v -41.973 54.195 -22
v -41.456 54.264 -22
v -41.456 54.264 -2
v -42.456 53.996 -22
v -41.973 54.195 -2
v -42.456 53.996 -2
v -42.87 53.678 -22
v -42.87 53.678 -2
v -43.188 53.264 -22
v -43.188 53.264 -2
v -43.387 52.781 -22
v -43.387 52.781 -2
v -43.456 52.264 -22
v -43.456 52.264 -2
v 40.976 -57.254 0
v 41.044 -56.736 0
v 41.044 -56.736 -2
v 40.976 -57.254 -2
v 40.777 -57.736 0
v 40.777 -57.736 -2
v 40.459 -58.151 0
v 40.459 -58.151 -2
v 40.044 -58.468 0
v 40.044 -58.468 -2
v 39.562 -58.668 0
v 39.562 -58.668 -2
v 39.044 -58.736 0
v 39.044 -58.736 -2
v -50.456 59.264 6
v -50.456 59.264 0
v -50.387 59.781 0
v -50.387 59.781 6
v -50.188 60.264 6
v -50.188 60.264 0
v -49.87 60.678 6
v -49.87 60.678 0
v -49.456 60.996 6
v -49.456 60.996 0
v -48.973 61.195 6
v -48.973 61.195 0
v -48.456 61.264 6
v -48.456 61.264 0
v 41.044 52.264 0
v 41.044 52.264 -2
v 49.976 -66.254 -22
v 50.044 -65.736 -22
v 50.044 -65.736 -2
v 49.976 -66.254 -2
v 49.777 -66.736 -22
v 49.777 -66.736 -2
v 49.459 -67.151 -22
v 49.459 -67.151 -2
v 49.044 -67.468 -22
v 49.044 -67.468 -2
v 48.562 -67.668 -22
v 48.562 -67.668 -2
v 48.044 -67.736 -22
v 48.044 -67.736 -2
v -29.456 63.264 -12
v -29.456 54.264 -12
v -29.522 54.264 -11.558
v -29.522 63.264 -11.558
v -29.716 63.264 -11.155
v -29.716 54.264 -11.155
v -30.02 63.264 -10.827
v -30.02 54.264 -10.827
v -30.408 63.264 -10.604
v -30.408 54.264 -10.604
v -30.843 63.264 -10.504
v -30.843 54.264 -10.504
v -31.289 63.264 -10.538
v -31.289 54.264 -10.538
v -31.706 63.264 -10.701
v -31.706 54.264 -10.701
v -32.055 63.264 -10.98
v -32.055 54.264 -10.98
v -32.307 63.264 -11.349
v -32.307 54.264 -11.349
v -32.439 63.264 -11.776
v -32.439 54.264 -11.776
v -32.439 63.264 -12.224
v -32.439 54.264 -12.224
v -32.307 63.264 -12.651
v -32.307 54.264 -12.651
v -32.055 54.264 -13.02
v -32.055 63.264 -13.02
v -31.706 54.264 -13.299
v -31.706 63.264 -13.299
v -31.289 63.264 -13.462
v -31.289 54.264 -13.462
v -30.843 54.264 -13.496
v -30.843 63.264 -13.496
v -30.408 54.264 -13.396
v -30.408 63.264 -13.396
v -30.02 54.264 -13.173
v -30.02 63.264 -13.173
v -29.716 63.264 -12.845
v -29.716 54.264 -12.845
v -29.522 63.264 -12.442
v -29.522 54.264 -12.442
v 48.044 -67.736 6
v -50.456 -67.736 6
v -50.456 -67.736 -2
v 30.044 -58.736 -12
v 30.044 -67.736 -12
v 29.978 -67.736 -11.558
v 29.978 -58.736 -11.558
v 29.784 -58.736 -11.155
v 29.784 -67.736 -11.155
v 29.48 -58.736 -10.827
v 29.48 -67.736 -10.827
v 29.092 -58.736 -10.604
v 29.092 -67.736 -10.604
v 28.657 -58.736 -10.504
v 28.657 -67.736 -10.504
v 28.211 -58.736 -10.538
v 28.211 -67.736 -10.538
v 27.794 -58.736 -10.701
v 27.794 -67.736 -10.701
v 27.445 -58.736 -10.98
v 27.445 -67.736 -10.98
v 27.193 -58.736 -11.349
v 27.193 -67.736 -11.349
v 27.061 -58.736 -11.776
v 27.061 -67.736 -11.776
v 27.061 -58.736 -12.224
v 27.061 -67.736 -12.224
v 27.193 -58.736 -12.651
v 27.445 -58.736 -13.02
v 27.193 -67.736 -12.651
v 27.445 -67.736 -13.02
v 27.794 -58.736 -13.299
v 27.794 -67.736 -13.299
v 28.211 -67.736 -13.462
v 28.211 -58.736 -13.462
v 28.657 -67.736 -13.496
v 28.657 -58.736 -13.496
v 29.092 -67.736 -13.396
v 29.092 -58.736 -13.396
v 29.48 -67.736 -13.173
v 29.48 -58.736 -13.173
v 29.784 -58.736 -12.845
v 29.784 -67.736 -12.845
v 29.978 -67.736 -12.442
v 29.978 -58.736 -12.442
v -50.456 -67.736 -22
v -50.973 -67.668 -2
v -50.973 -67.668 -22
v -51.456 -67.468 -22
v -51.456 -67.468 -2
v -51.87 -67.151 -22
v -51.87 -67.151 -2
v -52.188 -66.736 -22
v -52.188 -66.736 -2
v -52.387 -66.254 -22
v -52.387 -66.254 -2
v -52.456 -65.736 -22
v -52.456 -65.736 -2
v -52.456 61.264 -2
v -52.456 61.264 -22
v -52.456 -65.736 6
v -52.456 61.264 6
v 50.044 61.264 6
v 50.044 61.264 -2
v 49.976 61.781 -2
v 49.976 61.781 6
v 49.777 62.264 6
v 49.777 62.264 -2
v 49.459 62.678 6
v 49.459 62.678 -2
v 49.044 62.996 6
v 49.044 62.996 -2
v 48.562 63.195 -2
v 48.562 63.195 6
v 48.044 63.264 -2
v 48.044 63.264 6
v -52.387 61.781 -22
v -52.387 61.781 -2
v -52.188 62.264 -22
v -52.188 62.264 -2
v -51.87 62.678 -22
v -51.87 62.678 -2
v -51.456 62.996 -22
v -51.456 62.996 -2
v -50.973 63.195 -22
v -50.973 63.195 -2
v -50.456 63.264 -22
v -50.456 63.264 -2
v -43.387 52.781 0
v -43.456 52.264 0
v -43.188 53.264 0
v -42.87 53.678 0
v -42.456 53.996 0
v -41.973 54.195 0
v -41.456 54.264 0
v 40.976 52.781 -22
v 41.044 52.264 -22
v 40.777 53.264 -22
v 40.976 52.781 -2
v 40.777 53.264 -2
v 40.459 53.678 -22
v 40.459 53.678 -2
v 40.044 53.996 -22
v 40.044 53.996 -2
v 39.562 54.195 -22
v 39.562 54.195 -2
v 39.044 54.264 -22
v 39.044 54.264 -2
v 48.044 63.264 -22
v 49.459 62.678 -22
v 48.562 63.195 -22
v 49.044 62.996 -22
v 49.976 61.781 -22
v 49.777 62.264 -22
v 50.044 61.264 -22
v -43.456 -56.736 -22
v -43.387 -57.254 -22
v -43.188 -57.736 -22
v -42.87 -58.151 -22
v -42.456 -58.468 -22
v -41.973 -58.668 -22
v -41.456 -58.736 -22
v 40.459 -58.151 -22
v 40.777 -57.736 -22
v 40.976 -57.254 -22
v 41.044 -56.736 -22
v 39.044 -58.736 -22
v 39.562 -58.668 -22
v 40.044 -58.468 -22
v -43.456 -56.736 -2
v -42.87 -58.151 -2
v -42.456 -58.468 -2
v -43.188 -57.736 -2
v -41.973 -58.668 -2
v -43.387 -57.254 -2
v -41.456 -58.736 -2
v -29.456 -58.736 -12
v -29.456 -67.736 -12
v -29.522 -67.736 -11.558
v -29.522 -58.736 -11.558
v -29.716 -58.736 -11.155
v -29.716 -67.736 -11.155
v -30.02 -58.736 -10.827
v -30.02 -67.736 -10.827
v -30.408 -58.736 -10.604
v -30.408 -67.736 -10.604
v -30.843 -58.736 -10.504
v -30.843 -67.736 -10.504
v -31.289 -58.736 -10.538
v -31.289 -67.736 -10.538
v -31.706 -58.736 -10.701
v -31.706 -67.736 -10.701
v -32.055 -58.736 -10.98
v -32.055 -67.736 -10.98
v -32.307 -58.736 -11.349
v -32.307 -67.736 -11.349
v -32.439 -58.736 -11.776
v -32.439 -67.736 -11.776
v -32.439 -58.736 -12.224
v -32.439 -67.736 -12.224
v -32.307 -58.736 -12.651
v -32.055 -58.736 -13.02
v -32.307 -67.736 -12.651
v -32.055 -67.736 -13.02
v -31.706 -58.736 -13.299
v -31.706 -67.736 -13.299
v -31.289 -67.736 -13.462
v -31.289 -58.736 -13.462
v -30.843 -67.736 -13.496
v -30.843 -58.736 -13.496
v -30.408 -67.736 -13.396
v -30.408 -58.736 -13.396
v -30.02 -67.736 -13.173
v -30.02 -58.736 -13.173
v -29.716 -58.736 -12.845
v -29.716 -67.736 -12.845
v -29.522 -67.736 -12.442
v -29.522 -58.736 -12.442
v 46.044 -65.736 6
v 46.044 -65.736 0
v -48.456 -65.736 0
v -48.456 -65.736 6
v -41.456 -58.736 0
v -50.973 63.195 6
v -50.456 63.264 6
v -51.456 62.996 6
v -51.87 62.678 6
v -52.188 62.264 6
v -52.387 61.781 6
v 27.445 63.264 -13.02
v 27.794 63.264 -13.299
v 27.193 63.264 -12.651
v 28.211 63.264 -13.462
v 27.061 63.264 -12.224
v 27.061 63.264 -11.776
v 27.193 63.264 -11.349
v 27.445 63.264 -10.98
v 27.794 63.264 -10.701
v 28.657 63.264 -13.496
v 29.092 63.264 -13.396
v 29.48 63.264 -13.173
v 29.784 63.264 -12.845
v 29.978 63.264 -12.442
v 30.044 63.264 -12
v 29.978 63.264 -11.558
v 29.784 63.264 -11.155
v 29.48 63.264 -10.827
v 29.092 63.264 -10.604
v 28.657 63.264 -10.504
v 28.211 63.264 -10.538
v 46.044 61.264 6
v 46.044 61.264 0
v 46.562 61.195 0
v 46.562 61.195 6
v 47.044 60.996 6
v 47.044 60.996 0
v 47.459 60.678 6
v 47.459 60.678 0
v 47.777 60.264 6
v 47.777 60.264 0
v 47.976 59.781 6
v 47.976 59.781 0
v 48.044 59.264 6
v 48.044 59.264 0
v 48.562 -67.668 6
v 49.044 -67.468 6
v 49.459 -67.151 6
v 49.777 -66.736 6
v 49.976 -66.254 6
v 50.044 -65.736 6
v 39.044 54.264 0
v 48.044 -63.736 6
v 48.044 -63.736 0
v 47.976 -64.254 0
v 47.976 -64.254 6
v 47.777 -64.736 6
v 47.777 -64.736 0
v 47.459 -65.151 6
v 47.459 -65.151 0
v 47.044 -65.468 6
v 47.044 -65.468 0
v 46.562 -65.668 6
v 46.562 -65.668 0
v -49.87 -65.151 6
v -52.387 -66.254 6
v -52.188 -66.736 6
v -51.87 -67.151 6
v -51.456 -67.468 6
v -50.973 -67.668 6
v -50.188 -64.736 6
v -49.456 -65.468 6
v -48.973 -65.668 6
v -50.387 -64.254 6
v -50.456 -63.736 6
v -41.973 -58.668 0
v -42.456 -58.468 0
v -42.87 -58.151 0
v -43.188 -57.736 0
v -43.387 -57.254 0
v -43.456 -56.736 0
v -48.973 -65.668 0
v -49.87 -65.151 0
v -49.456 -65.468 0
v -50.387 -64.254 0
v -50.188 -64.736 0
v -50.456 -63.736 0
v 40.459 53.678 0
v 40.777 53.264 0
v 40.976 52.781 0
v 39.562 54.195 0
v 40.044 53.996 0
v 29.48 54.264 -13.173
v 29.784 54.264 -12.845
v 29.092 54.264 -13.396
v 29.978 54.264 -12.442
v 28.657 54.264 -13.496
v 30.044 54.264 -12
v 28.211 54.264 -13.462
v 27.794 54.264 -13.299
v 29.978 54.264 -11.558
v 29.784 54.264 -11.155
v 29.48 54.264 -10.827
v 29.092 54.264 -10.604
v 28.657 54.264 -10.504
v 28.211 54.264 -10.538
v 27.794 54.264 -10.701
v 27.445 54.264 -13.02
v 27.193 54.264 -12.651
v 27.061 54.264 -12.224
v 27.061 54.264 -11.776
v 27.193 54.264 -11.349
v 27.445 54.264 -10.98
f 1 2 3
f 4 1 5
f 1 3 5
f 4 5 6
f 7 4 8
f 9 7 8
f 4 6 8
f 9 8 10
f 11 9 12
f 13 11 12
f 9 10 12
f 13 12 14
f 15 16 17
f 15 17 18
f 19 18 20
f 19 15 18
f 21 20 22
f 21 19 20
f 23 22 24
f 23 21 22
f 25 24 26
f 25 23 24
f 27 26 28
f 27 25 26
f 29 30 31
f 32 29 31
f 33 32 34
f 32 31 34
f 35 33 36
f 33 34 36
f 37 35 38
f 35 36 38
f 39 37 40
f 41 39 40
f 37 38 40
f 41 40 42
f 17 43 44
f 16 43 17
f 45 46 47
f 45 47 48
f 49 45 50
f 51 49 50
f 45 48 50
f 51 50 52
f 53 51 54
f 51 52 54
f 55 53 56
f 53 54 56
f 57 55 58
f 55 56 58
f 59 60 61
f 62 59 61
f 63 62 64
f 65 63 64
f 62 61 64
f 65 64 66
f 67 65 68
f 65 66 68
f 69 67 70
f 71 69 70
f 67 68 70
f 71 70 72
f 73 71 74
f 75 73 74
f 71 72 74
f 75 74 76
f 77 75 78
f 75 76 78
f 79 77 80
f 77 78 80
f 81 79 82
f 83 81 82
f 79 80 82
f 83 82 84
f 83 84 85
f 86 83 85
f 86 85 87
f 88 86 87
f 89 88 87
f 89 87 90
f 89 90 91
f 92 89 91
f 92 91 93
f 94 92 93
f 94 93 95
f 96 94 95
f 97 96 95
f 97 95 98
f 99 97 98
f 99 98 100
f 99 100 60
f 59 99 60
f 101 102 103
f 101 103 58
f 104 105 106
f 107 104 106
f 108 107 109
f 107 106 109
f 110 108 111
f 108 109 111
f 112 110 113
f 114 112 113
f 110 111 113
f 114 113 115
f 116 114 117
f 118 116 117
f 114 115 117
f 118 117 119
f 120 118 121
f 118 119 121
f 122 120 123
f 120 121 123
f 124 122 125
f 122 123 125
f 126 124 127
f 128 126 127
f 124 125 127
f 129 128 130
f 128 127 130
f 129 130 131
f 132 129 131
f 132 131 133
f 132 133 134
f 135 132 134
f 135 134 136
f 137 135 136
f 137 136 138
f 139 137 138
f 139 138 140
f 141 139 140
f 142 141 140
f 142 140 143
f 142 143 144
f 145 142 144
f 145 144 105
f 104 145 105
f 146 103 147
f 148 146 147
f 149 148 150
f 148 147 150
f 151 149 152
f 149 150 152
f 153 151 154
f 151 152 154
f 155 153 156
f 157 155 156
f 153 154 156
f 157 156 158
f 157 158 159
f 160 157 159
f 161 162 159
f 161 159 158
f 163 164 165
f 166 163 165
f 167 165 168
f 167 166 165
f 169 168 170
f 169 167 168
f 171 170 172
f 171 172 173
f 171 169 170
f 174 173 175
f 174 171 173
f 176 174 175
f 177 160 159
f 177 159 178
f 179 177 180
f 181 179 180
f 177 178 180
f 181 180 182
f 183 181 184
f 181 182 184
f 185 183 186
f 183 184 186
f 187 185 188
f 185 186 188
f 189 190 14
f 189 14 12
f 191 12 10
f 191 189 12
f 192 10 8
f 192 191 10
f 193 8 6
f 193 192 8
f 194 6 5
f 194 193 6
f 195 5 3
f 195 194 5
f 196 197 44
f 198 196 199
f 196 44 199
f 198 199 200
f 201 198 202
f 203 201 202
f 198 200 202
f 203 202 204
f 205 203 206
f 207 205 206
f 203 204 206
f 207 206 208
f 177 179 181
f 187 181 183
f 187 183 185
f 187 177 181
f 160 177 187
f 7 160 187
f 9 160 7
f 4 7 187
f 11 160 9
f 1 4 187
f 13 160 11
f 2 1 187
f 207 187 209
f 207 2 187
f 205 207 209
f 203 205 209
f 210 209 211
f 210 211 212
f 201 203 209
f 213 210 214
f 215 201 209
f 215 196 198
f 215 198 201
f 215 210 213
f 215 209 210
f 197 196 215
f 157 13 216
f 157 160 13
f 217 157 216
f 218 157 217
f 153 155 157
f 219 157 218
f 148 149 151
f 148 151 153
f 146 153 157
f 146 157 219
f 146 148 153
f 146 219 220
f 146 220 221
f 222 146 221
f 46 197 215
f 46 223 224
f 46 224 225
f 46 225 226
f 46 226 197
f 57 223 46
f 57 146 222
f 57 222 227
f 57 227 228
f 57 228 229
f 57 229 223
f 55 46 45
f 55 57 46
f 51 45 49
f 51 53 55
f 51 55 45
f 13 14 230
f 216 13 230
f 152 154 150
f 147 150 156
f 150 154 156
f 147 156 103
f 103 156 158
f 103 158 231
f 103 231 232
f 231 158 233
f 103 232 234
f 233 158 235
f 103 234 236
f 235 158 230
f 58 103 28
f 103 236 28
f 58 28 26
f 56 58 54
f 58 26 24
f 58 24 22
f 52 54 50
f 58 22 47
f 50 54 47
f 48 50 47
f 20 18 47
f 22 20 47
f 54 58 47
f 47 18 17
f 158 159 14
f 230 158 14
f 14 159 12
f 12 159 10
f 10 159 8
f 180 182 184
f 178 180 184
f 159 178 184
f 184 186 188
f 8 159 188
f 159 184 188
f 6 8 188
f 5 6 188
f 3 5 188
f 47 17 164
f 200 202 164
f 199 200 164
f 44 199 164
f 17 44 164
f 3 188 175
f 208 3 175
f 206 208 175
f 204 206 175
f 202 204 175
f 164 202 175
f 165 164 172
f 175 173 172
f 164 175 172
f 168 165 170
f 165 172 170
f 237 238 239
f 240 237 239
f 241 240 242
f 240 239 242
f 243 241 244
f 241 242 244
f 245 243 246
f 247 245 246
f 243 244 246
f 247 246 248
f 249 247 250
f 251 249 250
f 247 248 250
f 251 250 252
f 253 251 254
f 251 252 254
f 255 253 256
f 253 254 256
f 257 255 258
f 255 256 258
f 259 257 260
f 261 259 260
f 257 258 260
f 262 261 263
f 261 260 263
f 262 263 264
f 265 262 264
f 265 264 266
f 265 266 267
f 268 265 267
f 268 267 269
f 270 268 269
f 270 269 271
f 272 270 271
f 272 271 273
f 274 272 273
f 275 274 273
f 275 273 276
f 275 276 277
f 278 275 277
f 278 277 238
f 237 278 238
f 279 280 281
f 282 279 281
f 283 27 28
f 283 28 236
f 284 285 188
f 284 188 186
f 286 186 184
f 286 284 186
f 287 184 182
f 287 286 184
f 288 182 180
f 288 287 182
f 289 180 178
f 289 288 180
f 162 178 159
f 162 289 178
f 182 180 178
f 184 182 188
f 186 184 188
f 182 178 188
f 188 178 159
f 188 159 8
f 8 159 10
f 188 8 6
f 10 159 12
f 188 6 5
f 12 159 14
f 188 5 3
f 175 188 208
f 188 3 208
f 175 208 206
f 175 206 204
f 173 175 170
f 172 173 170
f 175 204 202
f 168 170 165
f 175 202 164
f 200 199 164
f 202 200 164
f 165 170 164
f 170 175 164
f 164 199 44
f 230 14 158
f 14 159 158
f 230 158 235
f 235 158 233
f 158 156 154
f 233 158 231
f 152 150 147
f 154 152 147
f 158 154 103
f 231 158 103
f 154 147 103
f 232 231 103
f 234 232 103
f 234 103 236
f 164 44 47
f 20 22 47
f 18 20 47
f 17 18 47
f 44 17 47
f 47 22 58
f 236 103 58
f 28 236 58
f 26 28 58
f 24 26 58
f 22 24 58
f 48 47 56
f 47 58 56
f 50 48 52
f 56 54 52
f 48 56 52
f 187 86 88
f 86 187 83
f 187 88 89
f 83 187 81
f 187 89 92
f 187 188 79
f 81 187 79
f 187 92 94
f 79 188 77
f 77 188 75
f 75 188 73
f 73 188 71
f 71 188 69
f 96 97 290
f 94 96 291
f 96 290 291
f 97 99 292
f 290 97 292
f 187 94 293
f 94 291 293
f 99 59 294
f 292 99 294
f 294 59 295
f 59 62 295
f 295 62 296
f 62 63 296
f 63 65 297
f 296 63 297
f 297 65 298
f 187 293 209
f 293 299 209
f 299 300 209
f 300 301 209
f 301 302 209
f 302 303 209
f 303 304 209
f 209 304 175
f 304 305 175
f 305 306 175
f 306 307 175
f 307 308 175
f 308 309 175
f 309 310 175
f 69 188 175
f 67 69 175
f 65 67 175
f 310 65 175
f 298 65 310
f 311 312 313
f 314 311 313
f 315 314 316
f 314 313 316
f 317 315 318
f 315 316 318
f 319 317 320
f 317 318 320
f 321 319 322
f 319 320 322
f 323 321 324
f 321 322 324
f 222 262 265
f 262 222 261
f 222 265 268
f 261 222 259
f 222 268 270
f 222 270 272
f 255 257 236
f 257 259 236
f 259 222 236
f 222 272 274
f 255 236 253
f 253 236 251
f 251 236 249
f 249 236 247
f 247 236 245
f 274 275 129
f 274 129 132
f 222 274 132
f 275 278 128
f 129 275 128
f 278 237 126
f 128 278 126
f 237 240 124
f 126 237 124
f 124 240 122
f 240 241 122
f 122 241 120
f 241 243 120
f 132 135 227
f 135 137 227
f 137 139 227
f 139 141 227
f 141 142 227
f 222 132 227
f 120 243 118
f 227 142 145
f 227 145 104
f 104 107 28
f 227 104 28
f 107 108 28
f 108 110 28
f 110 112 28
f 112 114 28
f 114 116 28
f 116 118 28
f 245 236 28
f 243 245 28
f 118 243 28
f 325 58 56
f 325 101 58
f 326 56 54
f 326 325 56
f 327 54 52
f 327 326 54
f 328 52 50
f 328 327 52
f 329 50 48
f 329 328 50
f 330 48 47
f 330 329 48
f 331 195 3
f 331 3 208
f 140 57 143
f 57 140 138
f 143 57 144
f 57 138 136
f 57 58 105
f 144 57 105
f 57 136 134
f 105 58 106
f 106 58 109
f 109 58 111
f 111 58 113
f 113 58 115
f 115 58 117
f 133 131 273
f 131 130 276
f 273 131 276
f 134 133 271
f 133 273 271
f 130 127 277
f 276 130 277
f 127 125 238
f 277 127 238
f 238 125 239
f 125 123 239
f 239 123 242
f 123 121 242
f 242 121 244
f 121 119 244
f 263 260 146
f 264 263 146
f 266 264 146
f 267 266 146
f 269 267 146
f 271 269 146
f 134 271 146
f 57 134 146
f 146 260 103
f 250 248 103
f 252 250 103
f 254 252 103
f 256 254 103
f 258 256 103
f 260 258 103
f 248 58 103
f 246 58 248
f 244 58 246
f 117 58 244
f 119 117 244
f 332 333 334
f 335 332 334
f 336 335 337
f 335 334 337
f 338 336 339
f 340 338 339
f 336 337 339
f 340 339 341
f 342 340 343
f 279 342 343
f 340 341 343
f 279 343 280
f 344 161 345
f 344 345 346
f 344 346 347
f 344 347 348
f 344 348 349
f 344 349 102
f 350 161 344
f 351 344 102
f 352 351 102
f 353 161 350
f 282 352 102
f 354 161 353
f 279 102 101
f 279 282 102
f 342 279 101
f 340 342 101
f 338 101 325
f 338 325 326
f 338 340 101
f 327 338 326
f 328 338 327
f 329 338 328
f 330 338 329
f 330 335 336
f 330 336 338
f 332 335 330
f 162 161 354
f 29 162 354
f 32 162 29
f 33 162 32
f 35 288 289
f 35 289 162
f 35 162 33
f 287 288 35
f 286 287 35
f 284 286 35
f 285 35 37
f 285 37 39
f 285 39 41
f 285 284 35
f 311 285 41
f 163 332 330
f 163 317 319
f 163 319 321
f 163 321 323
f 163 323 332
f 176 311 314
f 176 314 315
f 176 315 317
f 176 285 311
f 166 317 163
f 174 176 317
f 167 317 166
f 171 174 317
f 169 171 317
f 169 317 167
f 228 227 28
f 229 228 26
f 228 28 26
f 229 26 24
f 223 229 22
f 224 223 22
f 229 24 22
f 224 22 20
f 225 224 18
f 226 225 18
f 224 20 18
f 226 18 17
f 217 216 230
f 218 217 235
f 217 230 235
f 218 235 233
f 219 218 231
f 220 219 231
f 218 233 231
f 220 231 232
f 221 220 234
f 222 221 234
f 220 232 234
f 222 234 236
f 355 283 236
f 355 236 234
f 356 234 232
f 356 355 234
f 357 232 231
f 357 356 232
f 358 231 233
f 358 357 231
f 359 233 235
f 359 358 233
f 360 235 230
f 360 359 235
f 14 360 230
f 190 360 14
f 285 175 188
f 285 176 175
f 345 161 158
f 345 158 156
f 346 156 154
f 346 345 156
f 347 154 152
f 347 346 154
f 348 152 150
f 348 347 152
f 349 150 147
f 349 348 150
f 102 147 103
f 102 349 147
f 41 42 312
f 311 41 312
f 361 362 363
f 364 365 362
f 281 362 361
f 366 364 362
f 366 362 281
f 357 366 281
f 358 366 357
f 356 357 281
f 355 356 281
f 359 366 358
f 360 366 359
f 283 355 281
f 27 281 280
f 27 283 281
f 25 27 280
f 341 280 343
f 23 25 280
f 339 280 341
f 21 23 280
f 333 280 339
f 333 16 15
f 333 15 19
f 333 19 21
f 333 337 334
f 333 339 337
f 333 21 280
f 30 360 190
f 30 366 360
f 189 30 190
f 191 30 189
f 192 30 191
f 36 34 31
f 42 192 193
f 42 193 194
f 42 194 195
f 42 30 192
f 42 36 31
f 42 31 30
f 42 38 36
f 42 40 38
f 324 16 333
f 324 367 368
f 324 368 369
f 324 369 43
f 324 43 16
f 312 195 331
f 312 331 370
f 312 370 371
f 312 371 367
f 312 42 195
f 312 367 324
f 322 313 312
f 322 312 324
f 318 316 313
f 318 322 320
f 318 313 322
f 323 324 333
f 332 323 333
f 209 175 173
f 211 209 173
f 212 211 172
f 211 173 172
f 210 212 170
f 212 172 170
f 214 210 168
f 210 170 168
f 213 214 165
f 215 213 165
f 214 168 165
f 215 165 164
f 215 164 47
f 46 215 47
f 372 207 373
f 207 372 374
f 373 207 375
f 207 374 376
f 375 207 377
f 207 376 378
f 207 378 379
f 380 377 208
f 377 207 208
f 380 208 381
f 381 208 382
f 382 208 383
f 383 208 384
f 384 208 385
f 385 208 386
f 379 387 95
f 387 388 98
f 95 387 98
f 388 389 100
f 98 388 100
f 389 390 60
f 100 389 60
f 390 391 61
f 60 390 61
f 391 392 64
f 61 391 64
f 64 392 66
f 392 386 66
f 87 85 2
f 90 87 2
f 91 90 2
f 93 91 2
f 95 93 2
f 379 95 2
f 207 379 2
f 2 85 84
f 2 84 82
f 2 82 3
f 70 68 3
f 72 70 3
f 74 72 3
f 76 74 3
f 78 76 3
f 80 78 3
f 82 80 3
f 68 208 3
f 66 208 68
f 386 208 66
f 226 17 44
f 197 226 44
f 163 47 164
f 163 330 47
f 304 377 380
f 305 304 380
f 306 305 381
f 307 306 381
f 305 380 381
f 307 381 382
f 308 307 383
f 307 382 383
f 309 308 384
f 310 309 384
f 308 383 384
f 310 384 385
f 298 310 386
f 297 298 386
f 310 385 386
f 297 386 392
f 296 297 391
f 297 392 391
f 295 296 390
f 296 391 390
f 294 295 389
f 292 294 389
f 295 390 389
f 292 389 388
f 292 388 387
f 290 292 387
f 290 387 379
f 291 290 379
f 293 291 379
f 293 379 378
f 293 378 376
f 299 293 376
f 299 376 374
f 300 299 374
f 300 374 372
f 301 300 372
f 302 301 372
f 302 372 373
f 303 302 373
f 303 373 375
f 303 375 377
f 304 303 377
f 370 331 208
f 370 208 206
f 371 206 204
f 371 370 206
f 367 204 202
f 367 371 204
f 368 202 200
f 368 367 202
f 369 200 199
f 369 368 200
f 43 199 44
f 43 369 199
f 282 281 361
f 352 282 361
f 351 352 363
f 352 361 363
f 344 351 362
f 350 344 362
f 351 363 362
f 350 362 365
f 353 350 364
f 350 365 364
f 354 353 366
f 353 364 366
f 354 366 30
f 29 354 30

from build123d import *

# Parameters (mm, degrees)
F1_DEPTH = 6
F3_DEPTH = 2
F4_DEPTH = 20
F5_R     = 1.5
F6_DEPTH = 135


with BuildPart() as f1:
    # F0 (on Top) → F1 (new body)
    with BuildSketch(Plane.XY):
        with BuildLine():
            Line((48.044474, 63.263562), (-50.455526, 63.263562))
            ThreePointArc((-50.455526, 63.263562), (-51.869739, 62.677775), (-52.455526, 61.263562))
            Line((-52.455526, 61.263562), (-52.455526, -65.736438))
            ThreePointArc((-52.455526, -65.736438), (-51.869739, -67.150652), (-50.455526, -67.736438))
            Line((-50.455526, -67.736438), (48.044474, -67.736438))
            ThreePointArc((48.044474, -67.736438), (49.458688, -67.150652), (50.044474, -65.736438))
            Line((50.044474, -65.736438), (50.044474, 61.263562))
            ThreePointArc((50.044474, 61.263562), (49.458688, 62.677775), (48.044474, 63.263562))
        make_face()
        with BuildLine():
            ThreePointArc((-50.455526, 59.263562), (-49.869739, 60.677775), (-48.455526, 61.263562))
            Line((-48.455526, 61.263562), (46.044474, 61.263562))
            ThreePointArc((46.044474, 61.263562), (47.458688, 60.677775), (48.044474, 59.263562))
            Line((48.044474, 59.263562), (48.044474, -63.736438))
            ThreePointArc((48.044474, -63.736438), (47.458688, -65.150652), (46.044474, -65.736438))
            Line((46.044474, -65.736438), (-48.455526, -65.736438))
            ThreePointArc((-48.455526, -65.736438), (-49.869739, -65.150652), (-50.455526, -63.736438))
            Line((-50.455526, -63.736438), (-50.455526, 59.263562))
        make_face(mode=Mode.SUBTRACT)
    extrude(amount=F1_DEPTH)

    # F2 (on Top) → F3 (join)
    with BuildSketch(Plane.XY):
        with BuildLine():
            Line((48.044474, 63.263562), (-50.455526, 63.263562))
            ThreePointArc((-50.455526, 63.263562), (-51.869739, 62.677775), (-52.455526, 61.263562))
            Line((-52.455526, 61.263562), (-52.455526, -65.736438))
            ThreePointArc((-52.455526, -65.736438), (-51.869739, -67.150652), (-50.455526, -67.736438))
            Line((-50.455526, -67.736438), (48.044474, -67.736438))
            ThreePointArc((48.044474, -67.736438), (49.458688, -67.150652), (50.044474, -65.736438))
            Line((50.044474, -65.736438), (50.044474, 61.263562))
            ThreePointArc((50.044474, 61.263562), (49.458688, 62.677775), (48.044474, 63.263562))
        make_face()
        with BuildLine():
            ThreePointArc((-43.455526, 52.263562), (-42.869739, 53.677775), (-41.455526, 54.263562))
            Line((-41.455526, 54.263562), (39.044474, 54.263562))
            ThreePointArc((39.044474, 54.263562), (40.458688, 53.677775), (41.044474, 52.263562))
            Line((41.044474, 52.263562), (41.044474, -56.736438))
            ThreePointArc((41.044474, -56.736438), (40.458688, -58.150652), (39.044474, -58.736438))
            Line((39.044474, -58.736438), (-41.455526, -58.736438))
            ThreePointArc((-41.455526, -58.736438), (-42.869739, -58.150652), (-43.455526, -56.736438))
            Line((-43.455526, -56.736438), (-43.455526, 52.263562))
        make_face(mode=Mode.SUBTRACT)
    extrude(amount=-F3_DEPTH)


with BuildPart() as f4:
    # F3_face (on face) → F4 (new body)
    with BuildSketch(Plane(origin=(-1.205526, -2.236438, -2), x_dir=(1, 0, 0), z_dir=(0, 0, -1))):
        with BuildLine():
            Line((-49.25, -65.5), (49.25, -65.5))
            ThreePointArc((49.25, -65.5), (50.664214, -64.914214), (51.25, -63.5))
            Line((51.25, -63.5), (51.25, 63.5))
            ThreePointArc((51.25, 63.5), (50.664214, 64.914214), (49.25, 65.5))
            Line((49.25, 65.5), (-49.25, 65.5))
            ThreePointArc((-49.25, 65.5), (-50.664214, 64.914214), (-51.25, 63.5))
            Line((-51.25, 63.5), (-51.25, -63.5))
            ThreePointArc((-51.25, -63.5), (-50.664214, -64.914214), (-49.25, -65.5))
        make_face()
        with BuildLine():
            Line((-42.25, -54.5), (-42.25, 54.5))
            ThreePointArc((-42.25, 54.5), (-41.664214, 55.914214), (-40.25, 56.5))
            Line((-40.25, 56.5), (40.25, 56.5))
            ThreePointArc((40.25, 56.5), (41.664214, 55.914214), (42.25, 54.5))
            Line((42.25, 54.5), (42.25, -54.5))
            ThreePointArc((42.25, -54.5), (41.664214, -55.914214), (40.25, -56.5))
            Line((40.25, -56.5), (-40.25, -56.5))
            ThreePointArc((-40.25, -56.5), (-41.664214, -55.914214), (-42.25, -54.5))
        make_face(mode=Mode.SUBTRACT)
    extrude(amount=F4_DEPTH)

    # F5 (on face) → F6 (cut)
    with BuildSketch(Plane.XZ.offset(67.736438)):
        with Locations((28.544474, -12)):
            Circle(F5_R)
        with Locations((-30.955526, -12)):
            Circle(F5_R)
    extrude(amount=-F6_DEPTH, mode=Mode.SUBTRACT)


solid = Compound([f1.part, f4.part])
